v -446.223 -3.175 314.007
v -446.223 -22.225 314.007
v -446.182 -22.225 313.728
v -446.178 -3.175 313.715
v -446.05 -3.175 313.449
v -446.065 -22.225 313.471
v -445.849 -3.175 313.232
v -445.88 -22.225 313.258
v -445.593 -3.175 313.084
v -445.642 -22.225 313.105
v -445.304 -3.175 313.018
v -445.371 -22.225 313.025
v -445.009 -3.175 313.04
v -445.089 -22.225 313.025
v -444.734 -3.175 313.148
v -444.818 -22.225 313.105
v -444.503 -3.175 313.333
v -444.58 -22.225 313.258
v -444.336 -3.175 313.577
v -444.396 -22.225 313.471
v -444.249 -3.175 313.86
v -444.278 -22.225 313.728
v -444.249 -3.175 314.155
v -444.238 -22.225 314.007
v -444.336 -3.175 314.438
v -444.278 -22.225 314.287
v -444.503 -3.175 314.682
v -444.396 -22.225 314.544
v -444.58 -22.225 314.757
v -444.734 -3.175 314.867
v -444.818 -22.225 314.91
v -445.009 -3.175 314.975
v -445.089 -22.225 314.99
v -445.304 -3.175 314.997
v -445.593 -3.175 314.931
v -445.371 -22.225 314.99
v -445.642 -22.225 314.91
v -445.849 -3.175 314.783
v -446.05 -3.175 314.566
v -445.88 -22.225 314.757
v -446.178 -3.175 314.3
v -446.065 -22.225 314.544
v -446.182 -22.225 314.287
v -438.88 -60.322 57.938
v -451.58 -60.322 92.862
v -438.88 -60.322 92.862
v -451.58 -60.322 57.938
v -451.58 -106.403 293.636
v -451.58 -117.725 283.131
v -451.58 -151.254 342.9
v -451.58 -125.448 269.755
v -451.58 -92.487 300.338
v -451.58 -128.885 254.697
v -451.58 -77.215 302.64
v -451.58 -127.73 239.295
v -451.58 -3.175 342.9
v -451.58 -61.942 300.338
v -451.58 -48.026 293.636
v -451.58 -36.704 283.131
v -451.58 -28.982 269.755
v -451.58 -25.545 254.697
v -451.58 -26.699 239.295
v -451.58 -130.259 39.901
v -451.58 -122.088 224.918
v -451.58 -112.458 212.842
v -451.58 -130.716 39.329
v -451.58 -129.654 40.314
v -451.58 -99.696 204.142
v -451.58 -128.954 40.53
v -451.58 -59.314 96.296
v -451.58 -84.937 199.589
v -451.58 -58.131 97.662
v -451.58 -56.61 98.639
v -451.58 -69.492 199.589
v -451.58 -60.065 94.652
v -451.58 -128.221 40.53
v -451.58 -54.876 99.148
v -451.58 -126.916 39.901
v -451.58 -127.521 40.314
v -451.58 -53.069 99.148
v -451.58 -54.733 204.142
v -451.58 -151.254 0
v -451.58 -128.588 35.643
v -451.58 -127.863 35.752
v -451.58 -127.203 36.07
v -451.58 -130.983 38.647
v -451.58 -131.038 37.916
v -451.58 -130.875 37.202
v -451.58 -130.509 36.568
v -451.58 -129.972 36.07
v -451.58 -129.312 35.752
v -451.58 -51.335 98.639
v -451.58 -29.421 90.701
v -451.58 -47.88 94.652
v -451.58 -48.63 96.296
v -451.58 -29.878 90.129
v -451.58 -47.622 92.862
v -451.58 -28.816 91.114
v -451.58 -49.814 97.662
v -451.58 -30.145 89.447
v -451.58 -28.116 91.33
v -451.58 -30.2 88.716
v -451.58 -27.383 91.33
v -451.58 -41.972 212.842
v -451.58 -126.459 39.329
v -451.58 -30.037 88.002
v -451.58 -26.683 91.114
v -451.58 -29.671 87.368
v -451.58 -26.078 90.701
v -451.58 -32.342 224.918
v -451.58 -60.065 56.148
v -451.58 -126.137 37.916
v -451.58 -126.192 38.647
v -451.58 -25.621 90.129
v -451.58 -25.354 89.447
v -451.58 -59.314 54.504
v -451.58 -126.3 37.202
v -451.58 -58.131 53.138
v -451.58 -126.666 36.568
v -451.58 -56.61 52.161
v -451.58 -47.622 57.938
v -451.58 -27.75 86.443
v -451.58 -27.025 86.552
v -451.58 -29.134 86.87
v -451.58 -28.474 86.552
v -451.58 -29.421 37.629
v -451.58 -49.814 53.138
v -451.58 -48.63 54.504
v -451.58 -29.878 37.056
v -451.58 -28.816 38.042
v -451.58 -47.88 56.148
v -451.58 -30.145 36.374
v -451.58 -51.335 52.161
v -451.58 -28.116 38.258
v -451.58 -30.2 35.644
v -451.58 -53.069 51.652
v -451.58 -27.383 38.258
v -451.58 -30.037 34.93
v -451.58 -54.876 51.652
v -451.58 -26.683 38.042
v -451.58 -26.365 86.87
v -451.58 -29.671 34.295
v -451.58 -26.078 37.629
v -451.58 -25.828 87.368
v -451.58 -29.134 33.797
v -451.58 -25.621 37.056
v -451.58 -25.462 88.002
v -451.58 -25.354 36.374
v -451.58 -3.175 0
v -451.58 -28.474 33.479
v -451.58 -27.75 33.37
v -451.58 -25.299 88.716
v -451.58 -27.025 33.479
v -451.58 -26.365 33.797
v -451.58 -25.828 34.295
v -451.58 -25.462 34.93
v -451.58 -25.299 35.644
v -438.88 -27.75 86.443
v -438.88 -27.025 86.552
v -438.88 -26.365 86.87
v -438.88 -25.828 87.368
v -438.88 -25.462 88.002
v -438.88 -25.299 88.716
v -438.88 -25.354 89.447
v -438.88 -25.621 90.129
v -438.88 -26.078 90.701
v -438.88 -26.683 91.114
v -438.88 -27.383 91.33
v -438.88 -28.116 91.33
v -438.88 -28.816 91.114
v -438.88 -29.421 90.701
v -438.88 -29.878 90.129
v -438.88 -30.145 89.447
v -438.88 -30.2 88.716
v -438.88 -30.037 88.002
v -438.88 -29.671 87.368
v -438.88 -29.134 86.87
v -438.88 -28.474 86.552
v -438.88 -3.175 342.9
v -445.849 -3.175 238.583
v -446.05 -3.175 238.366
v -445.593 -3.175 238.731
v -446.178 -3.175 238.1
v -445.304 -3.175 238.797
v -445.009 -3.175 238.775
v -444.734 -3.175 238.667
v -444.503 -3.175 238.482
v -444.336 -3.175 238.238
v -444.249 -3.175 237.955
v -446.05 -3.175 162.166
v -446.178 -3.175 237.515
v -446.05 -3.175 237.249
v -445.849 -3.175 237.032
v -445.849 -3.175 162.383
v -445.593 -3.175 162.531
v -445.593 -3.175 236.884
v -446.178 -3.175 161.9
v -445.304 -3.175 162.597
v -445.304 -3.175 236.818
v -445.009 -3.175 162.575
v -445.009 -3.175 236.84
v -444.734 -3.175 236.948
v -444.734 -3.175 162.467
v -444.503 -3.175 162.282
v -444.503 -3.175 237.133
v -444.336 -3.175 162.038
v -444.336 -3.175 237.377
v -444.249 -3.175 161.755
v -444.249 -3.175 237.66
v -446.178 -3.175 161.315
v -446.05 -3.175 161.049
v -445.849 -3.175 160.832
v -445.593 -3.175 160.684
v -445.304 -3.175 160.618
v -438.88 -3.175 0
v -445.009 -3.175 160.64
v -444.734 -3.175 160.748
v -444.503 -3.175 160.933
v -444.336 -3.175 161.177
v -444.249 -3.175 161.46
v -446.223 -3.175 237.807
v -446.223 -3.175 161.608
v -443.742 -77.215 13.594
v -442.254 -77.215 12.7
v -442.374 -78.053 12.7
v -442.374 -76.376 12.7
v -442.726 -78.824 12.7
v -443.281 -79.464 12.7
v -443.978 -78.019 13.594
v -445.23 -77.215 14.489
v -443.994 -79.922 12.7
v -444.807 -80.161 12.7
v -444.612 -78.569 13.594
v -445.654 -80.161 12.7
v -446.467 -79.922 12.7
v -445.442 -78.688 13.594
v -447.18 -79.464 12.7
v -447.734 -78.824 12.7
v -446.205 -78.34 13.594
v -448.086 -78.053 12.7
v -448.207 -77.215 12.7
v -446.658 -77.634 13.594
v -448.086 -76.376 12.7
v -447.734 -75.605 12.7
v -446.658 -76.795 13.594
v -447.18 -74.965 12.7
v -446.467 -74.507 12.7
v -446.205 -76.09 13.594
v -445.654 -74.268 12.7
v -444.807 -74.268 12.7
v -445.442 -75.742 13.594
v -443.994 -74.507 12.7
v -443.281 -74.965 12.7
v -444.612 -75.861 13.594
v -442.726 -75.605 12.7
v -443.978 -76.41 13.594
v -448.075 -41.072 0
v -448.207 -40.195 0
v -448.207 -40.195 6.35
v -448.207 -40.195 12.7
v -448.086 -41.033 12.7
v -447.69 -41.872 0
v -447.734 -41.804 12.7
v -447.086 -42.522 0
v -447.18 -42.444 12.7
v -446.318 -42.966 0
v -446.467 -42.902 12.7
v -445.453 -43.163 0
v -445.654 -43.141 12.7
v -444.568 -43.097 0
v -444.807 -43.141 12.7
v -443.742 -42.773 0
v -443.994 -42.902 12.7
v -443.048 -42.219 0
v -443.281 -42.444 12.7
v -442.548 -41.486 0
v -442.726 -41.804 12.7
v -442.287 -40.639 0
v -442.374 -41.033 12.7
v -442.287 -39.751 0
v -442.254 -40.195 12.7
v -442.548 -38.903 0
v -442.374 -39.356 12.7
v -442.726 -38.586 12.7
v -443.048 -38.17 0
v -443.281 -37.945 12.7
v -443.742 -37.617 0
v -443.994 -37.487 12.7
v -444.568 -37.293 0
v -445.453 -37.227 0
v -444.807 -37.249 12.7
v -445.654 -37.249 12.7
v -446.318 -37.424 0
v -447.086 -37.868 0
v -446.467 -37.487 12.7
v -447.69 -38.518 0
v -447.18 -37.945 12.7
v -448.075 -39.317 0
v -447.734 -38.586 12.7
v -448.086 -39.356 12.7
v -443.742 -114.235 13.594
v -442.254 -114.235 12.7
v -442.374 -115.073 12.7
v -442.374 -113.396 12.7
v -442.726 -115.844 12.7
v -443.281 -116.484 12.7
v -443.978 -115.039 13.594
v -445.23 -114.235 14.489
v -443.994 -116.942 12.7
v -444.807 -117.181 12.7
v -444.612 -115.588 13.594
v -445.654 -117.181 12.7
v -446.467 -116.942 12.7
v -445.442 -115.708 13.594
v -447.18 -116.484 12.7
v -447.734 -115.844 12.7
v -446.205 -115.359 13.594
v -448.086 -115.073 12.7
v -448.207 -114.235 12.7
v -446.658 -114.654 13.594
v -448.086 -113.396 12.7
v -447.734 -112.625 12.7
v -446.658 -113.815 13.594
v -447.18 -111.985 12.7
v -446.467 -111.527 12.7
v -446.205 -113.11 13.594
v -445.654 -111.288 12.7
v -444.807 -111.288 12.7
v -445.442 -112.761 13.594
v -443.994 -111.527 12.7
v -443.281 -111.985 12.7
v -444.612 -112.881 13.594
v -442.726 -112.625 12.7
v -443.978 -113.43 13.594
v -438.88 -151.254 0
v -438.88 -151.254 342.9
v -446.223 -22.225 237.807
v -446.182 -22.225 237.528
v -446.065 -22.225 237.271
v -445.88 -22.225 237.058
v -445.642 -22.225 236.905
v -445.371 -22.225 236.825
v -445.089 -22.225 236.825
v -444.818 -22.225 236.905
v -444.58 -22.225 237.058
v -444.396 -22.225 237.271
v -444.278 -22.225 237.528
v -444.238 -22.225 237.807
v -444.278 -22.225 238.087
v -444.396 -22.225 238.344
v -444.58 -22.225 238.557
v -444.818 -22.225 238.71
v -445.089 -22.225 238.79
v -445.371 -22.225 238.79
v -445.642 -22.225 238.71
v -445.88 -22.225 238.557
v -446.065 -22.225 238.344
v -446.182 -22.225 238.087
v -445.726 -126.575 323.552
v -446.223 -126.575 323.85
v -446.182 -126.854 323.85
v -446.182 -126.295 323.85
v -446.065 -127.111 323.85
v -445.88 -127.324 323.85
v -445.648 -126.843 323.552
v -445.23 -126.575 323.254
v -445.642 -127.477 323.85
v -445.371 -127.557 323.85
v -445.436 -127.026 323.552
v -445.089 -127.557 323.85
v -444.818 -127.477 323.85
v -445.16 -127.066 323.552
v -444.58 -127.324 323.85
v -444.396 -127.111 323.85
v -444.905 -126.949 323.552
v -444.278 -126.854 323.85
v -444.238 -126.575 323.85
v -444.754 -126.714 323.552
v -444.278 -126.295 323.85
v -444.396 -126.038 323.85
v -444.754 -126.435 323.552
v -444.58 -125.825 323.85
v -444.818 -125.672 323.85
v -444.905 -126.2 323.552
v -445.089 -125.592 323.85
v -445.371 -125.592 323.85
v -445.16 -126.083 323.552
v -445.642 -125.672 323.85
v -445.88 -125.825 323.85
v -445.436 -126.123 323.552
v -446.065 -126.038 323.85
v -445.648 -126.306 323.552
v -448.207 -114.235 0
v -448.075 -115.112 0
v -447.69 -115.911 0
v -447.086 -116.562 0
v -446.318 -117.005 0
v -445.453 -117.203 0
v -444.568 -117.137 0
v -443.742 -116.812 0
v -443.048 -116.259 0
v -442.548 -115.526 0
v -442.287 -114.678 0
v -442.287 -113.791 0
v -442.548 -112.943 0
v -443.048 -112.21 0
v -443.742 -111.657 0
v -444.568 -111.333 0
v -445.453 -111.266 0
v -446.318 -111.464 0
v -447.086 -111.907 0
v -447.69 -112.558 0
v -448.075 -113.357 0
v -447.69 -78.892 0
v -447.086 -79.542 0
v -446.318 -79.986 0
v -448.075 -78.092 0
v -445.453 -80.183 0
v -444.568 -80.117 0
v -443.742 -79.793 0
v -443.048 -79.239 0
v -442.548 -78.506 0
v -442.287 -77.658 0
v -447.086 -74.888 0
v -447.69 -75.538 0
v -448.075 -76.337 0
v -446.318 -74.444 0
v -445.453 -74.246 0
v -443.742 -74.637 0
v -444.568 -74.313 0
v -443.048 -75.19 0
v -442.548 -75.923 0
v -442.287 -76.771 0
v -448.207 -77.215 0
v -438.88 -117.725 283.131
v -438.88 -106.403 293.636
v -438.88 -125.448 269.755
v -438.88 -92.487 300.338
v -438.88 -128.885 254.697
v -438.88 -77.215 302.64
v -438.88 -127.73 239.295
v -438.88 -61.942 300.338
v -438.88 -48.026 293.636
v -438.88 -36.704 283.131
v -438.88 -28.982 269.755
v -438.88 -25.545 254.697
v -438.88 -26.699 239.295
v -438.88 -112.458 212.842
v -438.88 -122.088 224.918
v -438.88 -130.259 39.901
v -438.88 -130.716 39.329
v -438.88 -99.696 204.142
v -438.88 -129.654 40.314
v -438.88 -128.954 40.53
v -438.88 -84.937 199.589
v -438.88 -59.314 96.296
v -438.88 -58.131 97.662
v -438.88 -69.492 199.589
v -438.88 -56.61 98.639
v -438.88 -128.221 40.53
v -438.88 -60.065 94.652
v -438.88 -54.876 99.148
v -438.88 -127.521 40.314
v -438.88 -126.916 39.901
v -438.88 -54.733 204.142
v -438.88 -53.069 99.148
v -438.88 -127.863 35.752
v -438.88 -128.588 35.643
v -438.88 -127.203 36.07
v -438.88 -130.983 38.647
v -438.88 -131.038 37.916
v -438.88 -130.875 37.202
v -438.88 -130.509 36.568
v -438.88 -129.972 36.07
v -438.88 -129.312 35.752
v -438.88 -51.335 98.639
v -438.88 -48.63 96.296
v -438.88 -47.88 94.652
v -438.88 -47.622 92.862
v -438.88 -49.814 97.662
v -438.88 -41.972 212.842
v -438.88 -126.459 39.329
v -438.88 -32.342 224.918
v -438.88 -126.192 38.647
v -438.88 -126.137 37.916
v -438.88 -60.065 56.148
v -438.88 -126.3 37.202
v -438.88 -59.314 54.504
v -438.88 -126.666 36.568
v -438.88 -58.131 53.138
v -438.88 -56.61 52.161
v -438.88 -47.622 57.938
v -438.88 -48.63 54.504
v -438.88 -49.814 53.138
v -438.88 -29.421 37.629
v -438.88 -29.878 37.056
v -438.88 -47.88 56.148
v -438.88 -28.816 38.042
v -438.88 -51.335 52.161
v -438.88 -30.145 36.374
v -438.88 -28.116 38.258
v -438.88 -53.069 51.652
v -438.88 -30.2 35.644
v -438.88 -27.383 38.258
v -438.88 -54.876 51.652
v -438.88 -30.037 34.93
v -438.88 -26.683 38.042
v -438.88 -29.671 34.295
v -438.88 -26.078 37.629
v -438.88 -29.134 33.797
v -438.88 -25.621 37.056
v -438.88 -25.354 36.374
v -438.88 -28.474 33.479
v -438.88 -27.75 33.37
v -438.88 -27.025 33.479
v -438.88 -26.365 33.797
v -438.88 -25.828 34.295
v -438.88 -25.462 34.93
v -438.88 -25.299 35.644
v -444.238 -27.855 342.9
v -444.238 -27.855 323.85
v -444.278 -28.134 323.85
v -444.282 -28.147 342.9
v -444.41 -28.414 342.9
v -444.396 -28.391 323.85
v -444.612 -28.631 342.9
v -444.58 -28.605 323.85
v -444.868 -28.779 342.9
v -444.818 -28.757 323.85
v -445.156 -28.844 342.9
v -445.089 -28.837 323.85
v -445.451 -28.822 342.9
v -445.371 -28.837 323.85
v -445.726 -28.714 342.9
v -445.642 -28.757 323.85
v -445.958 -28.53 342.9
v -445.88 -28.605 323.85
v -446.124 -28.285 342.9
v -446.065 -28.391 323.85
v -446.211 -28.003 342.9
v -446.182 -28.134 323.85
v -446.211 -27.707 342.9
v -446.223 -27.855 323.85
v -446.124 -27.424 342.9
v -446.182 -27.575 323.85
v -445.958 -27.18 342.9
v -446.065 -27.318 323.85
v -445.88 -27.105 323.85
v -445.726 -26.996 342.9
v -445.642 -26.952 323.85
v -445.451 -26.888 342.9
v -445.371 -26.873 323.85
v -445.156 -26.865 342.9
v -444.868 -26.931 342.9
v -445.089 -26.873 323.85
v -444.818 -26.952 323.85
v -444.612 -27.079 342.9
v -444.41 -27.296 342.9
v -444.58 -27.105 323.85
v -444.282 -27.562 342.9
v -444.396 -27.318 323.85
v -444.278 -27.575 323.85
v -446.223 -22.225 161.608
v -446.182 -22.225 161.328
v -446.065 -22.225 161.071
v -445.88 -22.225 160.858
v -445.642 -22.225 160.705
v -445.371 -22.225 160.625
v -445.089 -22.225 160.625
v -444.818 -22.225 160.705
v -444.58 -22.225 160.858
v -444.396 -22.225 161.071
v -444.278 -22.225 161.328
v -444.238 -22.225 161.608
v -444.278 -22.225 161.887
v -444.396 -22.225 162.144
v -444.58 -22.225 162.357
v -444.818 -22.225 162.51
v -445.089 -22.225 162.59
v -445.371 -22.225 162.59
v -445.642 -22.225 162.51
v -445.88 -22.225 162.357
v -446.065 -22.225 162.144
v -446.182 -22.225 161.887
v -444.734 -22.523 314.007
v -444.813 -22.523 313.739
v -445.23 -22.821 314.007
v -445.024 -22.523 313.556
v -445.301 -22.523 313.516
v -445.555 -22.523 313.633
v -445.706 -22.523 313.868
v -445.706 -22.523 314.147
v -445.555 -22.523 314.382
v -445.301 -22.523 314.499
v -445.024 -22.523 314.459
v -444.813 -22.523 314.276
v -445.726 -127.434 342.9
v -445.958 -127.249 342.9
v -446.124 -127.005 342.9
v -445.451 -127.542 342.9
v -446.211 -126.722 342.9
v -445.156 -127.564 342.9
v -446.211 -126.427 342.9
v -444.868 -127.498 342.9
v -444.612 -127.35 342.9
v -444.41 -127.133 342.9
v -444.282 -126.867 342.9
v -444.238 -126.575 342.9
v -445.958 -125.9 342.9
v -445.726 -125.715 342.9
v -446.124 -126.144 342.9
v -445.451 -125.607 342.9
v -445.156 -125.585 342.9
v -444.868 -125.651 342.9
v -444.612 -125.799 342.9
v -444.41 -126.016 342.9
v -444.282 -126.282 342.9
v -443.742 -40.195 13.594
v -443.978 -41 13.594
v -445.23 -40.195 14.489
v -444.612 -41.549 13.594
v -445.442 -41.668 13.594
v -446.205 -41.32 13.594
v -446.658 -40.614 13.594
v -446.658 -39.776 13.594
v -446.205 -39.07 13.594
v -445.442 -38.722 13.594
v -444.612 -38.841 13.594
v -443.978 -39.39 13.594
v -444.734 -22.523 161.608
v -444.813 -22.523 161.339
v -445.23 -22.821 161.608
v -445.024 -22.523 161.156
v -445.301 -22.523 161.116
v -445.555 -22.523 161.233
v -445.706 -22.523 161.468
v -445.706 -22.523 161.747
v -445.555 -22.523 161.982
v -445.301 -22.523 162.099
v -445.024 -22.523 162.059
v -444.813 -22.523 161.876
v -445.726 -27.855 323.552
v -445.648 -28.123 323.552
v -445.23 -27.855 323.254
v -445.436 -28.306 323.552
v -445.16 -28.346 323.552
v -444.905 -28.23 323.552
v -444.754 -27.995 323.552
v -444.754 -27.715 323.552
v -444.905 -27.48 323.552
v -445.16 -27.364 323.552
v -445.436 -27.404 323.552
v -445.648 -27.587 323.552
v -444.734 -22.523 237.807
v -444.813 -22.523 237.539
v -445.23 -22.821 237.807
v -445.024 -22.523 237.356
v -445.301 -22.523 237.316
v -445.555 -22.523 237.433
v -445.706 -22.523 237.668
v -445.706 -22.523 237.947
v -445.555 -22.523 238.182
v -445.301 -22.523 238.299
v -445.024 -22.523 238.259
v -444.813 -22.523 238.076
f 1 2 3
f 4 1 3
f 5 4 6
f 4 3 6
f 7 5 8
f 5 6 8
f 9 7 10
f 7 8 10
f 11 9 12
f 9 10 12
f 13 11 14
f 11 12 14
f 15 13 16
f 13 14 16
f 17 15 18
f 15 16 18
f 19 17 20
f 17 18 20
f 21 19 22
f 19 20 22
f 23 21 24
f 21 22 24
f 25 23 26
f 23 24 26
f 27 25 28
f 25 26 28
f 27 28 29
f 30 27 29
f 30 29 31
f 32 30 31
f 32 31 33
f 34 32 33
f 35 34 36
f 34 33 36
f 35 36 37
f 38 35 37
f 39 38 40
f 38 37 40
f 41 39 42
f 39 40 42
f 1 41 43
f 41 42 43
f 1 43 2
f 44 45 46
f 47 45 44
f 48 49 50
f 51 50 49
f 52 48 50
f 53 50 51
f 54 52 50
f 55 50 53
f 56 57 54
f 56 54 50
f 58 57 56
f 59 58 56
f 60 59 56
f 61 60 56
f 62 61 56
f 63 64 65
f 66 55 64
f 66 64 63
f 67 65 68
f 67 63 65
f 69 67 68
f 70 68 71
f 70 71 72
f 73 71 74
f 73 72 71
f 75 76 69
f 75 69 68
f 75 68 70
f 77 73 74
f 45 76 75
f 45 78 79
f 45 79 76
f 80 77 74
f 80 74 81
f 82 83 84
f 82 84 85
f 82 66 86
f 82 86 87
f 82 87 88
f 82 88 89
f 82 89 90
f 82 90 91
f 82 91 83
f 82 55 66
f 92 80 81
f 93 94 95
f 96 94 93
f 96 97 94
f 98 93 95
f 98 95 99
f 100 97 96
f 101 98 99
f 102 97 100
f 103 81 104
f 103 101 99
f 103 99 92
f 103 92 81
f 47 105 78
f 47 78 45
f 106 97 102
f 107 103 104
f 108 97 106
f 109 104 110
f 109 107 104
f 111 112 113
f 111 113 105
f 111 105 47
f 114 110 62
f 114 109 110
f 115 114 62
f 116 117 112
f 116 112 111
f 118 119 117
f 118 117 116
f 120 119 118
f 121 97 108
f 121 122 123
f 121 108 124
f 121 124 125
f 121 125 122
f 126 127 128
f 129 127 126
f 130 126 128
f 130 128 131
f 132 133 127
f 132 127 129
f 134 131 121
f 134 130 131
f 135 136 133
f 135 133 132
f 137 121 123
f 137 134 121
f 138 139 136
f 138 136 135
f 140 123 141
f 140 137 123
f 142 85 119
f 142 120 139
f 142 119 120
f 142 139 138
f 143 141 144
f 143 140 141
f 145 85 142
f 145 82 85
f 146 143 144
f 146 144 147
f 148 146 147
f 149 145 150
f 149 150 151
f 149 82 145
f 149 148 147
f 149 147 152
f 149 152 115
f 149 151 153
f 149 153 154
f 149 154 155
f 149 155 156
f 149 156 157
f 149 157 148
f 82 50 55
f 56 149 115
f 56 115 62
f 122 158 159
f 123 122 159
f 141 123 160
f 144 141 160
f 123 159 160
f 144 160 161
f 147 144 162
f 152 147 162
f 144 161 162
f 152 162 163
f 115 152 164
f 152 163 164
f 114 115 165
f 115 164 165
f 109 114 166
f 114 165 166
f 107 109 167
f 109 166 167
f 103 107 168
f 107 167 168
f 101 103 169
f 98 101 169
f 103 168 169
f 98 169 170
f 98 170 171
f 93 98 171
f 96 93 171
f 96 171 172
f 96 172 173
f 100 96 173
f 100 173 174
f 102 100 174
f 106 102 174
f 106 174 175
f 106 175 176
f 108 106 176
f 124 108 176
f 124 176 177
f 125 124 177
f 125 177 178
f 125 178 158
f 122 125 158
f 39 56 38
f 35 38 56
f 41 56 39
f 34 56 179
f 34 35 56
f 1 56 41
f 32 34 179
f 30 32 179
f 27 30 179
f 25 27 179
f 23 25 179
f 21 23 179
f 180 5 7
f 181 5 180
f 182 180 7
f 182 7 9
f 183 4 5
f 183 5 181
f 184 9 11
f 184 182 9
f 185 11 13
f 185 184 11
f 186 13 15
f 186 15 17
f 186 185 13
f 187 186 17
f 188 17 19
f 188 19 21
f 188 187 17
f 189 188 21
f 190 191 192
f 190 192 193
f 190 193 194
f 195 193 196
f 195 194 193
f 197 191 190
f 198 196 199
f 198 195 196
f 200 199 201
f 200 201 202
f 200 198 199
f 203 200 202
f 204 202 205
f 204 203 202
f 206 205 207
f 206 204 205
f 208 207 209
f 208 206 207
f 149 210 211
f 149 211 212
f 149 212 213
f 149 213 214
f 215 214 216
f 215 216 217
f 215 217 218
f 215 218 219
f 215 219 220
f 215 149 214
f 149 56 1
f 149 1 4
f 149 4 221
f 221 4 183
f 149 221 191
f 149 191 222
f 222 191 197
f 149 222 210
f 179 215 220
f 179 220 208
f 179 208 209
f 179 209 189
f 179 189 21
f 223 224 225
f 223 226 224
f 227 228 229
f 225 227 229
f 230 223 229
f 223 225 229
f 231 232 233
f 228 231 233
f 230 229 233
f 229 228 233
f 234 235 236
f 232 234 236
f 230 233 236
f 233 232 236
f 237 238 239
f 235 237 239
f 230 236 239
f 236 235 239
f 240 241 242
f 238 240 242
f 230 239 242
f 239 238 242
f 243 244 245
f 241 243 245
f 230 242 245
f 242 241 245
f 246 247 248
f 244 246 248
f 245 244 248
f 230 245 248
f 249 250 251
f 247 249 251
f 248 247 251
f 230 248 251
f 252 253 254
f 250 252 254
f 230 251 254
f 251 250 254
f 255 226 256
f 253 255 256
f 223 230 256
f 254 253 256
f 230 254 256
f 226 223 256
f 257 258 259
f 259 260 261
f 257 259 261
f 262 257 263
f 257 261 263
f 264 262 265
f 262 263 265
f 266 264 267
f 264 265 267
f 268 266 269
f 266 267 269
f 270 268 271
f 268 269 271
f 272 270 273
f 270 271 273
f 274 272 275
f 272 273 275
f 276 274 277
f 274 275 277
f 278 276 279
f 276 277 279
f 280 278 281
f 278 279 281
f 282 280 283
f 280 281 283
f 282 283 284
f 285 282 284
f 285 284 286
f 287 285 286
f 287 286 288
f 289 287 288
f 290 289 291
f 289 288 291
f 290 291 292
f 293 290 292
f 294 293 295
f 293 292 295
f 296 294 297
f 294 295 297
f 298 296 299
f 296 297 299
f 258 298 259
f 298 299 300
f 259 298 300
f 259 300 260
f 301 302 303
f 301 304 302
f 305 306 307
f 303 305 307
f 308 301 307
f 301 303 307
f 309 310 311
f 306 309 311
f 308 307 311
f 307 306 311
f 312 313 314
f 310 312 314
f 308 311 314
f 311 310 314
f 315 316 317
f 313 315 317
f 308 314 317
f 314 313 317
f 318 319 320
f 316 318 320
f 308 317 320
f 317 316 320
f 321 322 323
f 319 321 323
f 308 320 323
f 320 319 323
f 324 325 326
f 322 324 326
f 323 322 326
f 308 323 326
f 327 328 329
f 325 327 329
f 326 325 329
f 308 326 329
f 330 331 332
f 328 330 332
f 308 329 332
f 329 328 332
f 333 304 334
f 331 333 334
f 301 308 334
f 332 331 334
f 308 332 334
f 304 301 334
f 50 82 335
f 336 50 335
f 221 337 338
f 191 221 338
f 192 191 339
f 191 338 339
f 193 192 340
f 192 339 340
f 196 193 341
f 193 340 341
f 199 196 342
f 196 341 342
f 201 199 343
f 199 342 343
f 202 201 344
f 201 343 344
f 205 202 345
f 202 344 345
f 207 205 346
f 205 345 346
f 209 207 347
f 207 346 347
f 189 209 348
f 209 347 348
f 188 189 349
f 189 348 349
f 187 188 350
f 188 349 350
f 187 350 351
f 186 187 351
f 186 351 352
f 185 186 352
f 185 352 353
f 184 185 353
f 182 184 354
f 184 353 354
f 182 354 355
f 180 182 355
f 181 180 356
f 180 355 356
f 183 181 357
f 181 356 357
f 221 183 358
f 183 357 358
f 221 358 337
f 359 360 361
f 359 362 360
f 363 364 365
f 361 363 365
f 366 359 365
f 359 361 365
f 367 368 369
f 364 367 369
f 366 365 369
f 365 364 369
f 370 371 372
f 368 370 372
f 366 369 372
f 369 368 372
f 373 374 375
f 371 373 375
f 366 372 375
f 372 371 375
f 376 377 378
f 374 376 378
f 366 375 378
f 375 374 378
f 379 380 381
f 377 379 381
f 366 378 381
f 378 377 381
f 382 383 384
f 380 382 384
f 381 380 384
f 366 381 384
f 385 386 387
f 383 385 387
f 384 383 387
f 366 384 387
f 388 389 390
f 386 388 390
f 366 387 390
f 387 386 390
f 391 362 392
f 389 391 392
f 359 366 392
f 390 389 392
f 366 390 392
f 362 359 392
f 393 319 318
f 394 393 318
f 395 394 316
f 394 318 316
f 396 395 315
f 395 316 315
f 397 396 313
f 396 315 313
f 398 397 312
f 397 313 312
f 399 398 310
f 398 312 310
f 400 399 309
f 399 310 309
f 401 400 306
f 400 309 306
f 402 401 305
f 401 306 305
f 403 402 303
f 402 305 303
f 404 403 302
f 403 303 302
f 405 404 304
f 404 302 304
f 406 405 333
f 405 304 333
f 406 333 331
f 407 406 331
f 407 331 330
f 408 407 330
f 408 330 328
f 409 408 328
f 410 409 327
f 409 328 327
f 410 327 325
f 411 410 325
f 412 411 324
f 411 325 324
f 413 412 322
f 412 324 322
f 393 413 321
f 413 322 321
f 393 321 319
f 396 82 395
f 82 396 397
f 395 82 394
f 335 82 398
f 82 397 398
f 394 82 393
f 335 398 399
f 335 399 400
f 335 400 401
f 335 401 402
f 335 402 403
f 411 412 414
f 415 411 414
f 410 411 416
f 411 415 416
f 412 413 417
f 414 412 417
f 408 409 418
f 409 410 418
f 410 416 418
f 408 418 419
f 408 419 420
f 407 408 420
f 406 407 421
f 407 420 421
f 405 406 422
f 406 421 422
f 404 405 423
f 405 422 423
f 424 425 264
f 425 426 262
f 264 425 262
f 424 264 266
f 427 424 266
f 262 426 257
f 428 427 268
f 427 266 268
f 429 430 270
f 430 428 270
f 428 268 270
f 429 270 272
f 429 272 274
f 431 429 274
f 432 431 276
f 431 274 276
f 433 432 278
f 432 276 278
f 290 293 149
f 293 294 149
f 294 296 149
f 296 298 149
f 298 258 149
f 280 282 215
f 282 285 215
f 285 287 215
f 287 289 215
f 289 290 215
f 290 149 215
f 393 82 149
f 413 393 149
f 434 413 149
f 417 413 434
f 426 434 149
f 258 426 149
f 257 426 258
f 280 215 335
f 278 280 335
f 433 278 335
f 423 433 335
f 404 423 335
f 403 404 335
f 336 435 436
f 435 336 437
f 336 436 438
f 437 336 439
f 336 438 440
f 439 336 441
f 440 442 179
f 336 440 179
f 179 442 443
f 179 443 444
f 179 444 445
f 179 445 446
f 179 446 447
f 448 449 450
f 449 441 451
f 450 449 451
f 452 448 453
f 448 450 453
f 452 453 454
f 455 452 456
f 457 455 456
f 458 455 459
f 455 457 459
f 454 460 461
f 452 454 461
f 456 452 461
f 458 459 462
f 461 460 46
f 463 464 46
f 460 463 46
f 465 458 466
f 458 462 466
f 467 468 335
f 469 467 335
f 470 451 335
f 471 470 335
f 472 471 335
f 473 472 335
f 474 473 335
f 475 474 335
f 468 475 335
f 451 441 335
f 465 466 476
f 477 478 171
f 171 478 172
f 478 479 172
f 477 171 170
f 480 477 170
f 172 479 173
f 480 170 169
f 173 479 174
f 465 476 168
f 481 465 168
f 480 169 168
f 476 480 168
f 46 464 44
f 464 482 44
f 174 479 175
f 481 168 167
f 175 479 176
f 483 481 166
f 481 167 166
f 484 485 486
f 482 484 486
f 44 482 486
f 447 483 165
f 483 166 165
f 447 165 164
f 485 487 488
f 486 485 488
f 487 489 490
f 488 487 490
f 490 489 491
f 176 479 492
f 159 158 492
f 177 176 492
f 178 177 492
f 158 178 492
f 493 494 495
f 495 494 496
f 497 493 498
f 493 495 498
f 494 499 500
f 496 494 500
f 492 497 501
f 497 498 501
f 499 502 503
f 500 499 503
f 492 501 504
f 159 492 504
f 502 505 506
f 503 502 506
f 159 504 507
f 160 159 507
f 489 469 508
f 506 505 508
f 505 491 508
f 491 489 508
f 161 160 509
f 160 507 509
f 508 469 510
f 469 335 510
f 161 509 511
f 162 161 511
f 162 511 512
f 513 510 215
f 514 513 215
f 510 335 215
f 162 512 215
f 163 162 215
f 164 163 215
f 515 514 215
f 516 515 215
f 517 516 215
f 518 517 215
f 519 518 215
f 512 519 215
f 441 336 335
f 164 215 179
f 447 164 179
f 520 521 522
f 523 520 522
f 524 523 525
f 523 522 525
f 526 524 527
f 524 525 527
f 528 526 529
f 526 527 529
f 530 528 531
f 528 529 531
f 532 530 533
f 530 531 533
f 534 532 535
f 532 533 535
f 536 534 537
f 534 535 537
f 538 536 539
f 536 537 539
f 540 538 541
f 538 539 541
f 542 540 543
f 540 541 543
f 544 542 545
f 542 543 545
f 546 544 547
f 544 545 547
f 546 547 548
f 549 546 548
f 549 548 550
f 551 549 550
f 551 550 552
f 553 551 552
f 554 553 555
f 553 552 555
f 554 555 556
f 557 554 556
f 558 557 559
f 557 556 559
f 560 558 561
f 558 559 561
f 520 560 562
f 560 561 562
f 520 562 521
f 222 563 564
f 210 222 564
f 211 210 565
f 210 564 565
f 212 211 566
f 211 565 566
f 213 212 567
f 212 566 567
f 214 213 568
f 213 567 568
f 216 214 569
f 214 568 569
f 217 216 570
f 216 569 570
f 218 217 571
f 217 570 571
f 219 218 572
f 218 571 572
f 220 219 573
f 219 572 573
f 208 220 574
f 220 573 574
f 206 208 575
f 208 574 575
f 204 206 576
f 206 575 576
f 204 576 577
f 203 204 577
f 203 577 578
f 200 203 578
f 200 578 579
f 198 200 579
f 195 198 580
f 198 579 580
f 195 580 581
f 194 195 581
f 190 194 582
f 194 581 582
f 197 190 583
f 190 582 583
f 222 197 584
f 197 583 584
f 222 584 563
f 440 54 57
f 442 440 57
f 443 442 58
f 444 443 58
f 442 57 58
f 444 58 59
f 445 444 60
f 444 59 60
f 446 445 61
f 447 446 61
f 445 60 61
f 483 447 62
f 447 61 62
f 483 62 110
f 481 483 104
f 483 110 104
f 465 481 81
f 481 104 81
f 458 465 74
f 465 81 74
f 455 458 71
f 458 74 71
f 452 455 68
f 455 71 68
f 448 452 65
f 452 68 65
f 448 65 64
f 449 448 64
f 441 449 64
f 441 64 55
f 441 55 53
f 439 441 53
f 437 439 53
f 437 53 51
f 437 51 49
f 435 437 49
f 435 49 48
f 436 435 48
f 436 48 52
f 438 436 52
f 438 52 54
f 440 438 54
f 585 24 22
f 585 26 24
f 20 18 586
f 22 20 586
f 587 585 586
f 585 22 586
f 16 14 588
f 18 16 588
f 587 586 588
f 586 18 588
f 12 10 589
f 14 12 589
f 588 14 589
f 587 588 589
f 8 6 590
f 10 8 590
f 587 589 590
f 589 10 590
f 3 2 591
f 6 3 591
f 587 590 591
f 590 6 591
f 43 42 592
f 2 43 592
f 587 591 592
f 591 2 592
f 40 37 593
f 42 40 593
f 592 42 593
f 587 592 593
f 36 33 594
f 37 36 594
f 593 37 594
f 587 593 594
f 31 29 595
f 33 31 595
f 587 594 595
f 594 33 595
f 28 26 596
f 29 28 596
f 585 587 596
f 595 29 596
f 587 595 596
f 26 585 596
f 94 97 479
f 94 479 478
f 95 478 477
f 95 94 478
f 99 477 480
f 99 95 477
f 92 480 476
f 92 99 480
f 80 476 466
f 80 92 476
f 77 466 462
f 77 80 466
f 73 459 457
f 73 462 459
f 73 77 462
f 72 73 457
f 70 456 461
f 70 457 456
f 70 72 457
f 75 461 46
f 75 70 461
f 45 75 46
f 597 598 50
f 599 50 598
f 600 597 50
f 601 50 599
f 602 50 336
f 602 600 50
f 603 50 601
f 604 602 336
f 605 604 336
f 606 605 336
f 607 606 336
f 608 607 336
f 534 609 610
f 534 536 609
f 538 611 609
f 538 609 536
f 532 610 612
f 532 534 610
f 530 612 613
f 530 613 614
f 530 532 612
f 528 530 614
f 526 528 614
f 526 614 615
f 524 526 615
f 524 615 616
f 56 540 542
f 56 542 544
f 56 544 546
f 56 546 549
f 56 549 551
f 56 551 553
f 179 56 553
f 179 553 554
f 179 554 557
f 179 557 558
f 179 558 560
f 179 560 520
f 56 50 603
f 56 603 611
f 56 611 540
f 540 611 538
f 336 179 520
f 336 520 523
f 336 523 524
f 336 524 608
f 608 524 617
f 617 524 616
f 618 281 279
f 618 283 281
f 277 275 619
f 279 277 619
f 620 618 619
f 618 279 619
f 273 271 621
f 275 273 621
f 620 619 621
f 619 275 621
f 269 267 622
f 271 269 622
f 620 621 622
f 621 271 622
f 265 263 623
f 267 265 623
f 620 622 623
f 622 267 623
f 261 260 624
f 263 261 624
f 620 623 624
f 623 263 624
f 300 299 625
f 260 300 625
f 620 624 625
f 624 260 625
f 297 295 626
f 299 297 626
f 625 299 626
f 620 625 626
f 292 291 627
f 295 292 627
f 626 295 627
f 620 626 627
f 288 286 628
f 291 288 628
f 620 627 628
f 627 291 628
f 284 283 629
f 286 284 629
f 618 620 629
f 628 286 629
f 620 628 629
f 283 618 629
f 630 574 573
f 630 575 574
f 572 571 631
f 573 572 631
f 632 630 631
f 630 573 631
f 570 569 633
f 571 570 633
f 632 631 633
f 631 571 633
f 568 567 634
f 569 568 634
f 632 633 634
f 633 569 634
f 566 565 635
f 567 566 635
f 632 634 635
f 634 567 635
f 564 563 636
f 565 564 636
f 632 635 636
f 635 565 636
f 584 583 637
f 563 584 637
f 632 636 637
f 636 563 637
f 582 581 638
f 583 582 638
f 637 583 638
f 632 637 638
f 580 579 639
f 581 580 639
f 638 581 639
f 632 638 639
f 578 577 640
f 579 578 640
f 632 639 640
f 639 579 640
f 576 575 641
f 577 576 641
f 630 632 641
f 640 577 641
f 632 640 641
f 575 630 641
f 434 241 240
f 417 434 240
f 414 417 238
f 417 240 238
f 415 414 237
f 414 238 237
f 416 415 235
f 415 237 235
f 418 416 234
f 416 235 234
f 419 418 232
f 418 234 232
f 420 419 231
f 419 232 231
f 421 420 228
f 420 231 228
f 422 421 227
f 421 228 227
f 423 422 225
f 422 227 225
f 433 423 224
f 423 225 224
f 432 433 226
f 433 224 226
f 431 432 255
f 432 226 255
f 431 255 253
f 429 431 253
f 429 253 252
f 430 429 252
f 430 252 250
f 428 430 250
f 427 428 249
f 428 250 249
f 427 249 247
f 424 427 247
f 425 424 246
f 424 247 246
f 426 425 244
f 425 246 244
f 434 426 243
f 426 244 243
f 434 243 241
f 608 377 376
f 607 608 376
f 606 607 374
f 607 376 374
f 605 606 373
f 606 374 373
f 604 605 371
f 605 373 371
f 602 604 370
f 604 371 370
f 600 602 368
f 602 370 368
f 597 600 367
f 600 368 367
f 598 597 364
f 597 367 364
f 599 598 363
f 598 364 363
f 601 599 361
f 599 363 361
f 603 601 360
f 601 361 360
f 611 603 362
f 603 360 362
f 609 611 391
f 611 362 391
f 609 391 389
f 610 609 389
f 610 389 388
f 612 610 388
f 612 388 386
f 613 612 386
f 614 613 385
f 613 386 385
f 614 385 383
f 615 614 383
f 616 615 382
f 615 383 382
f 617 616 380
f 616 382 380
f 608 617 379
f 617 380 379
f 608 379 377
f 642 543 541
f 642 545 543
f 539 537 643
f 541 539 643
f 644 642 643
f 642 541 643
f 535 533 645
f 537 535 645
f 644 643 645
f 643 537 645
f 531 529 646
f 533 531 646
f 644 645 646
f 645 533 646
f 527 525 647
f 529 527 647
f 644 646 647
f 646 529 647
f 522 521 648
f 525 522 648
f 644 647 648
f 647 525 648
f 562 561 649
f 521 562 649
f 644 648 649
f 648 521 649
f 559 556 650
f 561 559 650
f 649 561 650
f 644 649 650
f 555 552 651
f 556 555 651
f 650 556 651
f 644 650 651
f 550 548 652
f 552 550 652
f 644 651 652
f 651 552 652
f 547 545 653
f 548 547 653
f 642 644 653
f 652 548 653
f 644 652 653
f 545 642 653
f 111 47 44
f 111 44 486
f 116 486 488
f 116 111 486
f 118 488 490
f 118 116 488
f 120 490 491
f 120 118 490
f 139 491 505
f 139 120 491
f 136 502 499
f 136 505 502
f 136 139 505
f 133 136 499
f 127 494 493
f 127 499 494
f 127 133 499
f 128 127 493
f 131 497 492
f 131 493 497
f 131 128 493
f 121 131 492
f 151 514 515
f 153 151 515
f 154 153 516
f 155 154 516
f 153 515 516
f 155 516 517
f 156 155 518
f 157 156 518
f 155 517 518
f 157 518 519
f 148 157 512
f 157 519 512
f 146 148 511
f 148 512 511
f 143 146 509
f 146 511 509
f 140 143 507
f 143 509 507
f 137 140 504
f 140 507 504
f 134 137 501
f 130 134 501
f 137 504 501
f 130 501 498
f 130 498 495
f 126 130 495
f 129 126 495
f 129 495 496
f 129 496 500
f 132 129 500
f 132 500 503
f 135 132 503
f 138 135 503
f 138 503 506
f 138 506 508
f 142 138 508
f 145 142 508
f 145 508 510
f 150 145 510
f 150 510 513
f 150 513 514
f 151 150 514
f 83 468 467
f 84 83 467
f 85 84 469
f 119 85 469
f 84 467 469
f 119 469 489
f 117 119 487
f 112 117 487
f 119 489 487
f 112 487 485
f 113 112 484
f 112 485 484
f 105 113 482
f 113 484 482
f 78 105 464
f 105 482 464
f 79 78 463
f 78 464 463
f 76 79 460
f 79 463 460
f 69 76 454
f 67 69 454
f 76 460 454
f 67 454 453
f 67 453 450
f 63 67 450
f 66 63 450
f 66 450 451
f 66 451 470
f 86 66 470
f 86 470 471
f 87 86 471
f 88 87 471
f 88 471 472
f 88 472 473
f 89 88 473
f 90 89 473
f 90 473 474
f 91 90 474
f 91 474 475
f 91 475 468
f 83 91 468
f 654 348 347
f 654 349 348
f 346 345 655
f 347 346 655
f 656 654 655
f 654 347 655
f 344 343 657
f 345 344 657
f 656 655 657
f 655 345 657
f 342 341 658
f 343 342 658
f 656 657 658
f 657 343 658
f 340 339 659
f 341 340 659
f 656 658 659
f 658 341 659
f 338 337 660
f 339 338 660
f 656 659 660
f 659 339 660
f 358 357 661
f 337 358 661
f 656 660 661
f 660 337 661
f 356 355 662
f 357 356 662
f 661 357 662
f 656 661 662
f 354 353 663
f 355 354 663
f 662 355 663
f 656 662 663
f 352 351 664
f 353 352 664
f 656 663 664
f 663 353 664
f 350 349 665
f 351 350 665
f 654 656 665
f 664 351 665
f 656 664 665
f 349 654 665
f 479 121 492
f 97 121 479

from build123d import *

# Parameters (mm, degrees)
SKETCH1_W                                 = 12.7
SKETCH1_H                                 = 148.079451403
BOSS_EXTRUDE1_DEPTH                       = 342.9
F_15_64_0_23438_DIAMETER_HOLE1_D          = 5.953252
F_15_64_0_23438_DIAMETER_HOLE1_DEPTH      = 12.7
F_15_64_0_23438_DIAMETER_HOLE1_TIP        = 1.788537341
F_15_64_0_23438_DIAMETER_HOLE3_D          = 5.953252
F_15_64_0_23438_DIAMETER_HOLE3_DEPTH      = 19.05
F_15_64_0_23438_DIAMETER_HOLE3_TIP        = 1.788537341
F_5_64_0_07813_DIAMETER_HOLE1_D           = 1.984502
F_5_64_0_07813_DIAMETER_HOLE1_DEPTH       = 38.1
F_5_64_0_07813_DIAMETER_HOLE1_CSINK_D     = 10.16
F_5_64_0_07813_DIAMETER_HOLE1_CSINK_ANGLE = 82
F_5_64_0_07813_DIAMETER_HOLE1_TIP         = 0.59620455
F_5_64_0_07813_DIAMETER_HOLE2_D           = 1.984502
F_5_64_0_07813_DIAMETER_HOLE2_DEPTH       = 38.1
F_5_64_0_07813_DIAMETER_HOLE2_CSINK_D     = 10.16
F_5_64_0_07813_DIAMETER_HOLE2_CSINK_ANGLE = 82
F_5_64_0_07813_DIAMETER_HOLE2_TIP         = 0.59620455
F_8_CLEARANCE_HOLE1_D                     = 4.9149
F_8_CLEARANCE_HOLE1_DEPTH                 = 12.7
CUT_EXTRUDE1_REACH                        = 14.7
SKETCH14_R                                = 51.814725701
CUT_EXTRUDE2_REACH                        = 14.7


with BuildPart() as part:
    # Sketch1 → Boss-Extrude1 (new body)
    with BuildSketch(Plane.XY):
        with Locations((-445.23025, -77.214725702)):
            Rectangle(SKETCH1_W, SKETCH1_H)
    extrude(amount=BOSS_EXTRUDE1_DEPTH)

    # 15/64 (0.23438) Diameter Hole1
    with Locations(Plane(origin=(-183.67375, 1933.375856936, -6.35), x_dir=(1, 0, 0), z_dir=(0, 0, -1))):
        with Locations((-261.5565, 1973.570719787), (-261.5565, 2010.590582637), (-261.5565, 2047.610445488), (-97.5233, 2112.481693679), (-97.5233, 2147.688356936), (-43.36415, 2120.065856936), (1.27, 2120.065856936), (45.90415, 2120.065856936), (100.0633, 2147.688356936), (100.0633, 2112.481693679), (264.0965, 2047.610445488), (264.0965, 1973.570719787)):
            Hole(F_15_64_0_23438_DIAMETER_HOLE1_D / 2, depth=F_15_64_0_23438_DIAMETER_HOLE1_DEPTH)
            with Locations((0, 0, -(F_15_64_0_23438_DIAMETER_HOLE1_DEPTH + F_15_64_0_23438_DIAMETER_HOLE1_TIP / 2))):  # 118° drill point
                Cone(0, F_15_64_0_23438_DIAMETER_HOLE1_D / 2, F_15_64_0_23438_DIAMETER_HOLE1_TIP, mode=Mode.SUBTRACT)

    # 15/64 (0.23438) Diameter Hole3
    with Locations(Plane(origin=(-182.40375, 1936.853954382, -6.35), x_dir=(1, 0, 0), z_dir=(0, 0, -1))):
        with Locations((-262.8265, 2051.088542934), (-262.8265, 2014.068680083), (-262.8265, 1977.048817232), (-98.7933, 2115.959791125), (-98.7933, 2151.166454382)):
            Hole(F_15_64_0_23438_DIAMETER_HOLE3_D / 2, depth=F_15_64_0_23438_DIAMETER_HOLE3_DEPTH)
            with Locations((0, 0, -(F_15_64_0_23438_DIAMETER_HOLE3_DEPTH + F_15_64_0_23438_DIAMETER_HOLE3_TIP / 2))):  # 118° drill point
                Cone(0, F_15_64_0_23438_DIAMETER_HOLE3_D / 2, F_15_64_0_23438_DIAMETER_HOLE3_TIP, mode=Mode.SUBTRACT)

    # 5/64 (0.07813) Diameter Hole1
    with Locations(Plane(origin=(-182.40375, 15.875, 6471.459863233), x_dir=(1, 0, 0), z_dir=(0, 1, 0))):
        with Locations((-262.8265, 6157.452363233), (-98.7933, 6157.452363233), (-262.8265, 6233.652363233), (-98.7933, 6233.652363233), (-262.8265, 6309.852363233), (-98.7933, 6309.852363233), (-267.97, 6119.034863233), (-115.57, 6119.034863233), (-1.27, 6119.034863233), (113.03, 6119.034863233), (265.43, 6119.034863233), (96.2533, 6309.852363233), (260.2865, 6309.852363233), (96.2533, 6233.652363233), (260.2865, 6233.652363233), (96.2533, 6157.452363233), (260.2865, 6157.452363233)):
            CounterSinkHole(F_5_64_0_07813_DIAMETER_HOLE1_D / 2, F_5_64_0_07813_DIAMETER_HOLE1_CSINK_D / 2, depth=F_5_64_0_07813_DIAMETER_HOLE1_DEPTH, counter_sink_angle=F_5_64_0_07813_DIAMETER_HOLE1_CSINK_ANGLE)
            with Locations((0, 0, -(F_5_64_0_07813_DIAMETER_HOLE1_DEPTH + F_5_64_0_07813_DIAMETER_HOLE1_TIP / 2))):  # 118° drill point
                Cone(0, F_5_64_0_07813_DIAMETER_HOLE1_D / 2, F_5_64_0_07813_DIAMETER_HOLE1_TIP, mode=Mode.SUBTRACT)

    # 5/64 (0.07813) Diameter Hole2
    with Locations(Plane(origin=(-182.40375, 1936.853954382, 361.95), x_dir=(-1, 0, 0), z_dir=(0, 0, 1))):
        with Locations((-263.392416364, 1965.434682144), (262.8265, 1964.708862949), (262.8265, 2063.428497217), (98.7933, 2131.851871048), (98.7933, 1978.393537715), (53.56098, 2123.543954382), (-53.56098, 2123.543954382), (-99.322089753, 1978.666800322), (-98.898757225, 2132.124549748), (-263.120086856, 2064.153940785)):
            CounterSinkHole(F_5_64_0_07813_DIAMETER_HOLE2_D / 2, F_5_64_0_07813_DIAMETER_HOLE2_CSINK_D / 2, depth=F_5_64_0_07813_DIAMETER_HOLE2_DEPTH, counter_sink_angle=F_5_64_0_07813_DIAMETER_HOLE2_CSINK_ANGLE)
            with Locations((0, 0, -(F_5_64_0_07813_DIAMETER_HOLE2_DEPTH + F_5_64_0_07813_DIAMETER_HOLE2_TIP / 2))):  # 118° drill point
                Cone(0, F_5_64_0_07813_DIAMETER_HOLE2_D / 2, F_5_64_0_07813_DIAMETER_HOLE2_TIP, mode=Mode.SUBTRACT)

    # #8 Clearance Hole1
    with Locations(Plane.ZY.offset(451.58025)):
        with Locations((88.9, -27.7495), (35.8275, -27.7495), (38.1, -128.5875)):
            Hole(F_8_CLEARANCE_HOLE1_D / 2, depth=F_8_CLEARANCE_HOLE1_DEPTH)

    # Sketch14 → Cut-Extrude1 (cut, up to next)
    with BuildSketch(Plane.ZY.offset(451.58025), mode=Mode.PRIVATE) as cut_extrude1_sk1:
        with Locations((250.825, -77.214725701)):
            Circle(SKETCH14_R)
    cut_extrude1_tool1 = extrude(cut_extrude1_sk1.sketch, amount=-CUT_EXTRUDE1_REACH, mode=Mode.PRIVATE) & part.part
    add(cut_extrude1_tool1.solids().sort_by_distance((-451.58025, -77.214726, 250.825))[0], mode=Mode.SUBTRACT)

    # Sketch15 → Cut-Extrude2 (cut, up to next)
    with BuildSketch(Plane.ZY.offset(451.58025), mode=Mode.PRIVATE) as cut_extrude2_sk1:
        with BuildLine():
            Line((92.8625, -60.322451403), (57.9375, -60.322451403))
            ThreePointArc((57.9375, -60.322451403), (51.5875, -53.972451403), (57.9375, -47.622451403))
            Line((57.9375, -47.622451403), (92.8625, -47.622451403))
            ThreePointArc((92.8625, -47.622451403), (99.2125, -53.972451403), (92.8625, -60.322451403))
        make_face()
    cut_extrude2_tool1 = extrude(cut_extrude2_sk1.sketch, amount=-CUT_EXTRUDE2_REACH, mode=Mode.PRIVATE) & part.part
    add(cut_extrude2_tool1.solids().sort_by_distance((-451.58025, -53.972451, 75.4))[0], mode=Mode.SUBTRACT)


solid = part.part
